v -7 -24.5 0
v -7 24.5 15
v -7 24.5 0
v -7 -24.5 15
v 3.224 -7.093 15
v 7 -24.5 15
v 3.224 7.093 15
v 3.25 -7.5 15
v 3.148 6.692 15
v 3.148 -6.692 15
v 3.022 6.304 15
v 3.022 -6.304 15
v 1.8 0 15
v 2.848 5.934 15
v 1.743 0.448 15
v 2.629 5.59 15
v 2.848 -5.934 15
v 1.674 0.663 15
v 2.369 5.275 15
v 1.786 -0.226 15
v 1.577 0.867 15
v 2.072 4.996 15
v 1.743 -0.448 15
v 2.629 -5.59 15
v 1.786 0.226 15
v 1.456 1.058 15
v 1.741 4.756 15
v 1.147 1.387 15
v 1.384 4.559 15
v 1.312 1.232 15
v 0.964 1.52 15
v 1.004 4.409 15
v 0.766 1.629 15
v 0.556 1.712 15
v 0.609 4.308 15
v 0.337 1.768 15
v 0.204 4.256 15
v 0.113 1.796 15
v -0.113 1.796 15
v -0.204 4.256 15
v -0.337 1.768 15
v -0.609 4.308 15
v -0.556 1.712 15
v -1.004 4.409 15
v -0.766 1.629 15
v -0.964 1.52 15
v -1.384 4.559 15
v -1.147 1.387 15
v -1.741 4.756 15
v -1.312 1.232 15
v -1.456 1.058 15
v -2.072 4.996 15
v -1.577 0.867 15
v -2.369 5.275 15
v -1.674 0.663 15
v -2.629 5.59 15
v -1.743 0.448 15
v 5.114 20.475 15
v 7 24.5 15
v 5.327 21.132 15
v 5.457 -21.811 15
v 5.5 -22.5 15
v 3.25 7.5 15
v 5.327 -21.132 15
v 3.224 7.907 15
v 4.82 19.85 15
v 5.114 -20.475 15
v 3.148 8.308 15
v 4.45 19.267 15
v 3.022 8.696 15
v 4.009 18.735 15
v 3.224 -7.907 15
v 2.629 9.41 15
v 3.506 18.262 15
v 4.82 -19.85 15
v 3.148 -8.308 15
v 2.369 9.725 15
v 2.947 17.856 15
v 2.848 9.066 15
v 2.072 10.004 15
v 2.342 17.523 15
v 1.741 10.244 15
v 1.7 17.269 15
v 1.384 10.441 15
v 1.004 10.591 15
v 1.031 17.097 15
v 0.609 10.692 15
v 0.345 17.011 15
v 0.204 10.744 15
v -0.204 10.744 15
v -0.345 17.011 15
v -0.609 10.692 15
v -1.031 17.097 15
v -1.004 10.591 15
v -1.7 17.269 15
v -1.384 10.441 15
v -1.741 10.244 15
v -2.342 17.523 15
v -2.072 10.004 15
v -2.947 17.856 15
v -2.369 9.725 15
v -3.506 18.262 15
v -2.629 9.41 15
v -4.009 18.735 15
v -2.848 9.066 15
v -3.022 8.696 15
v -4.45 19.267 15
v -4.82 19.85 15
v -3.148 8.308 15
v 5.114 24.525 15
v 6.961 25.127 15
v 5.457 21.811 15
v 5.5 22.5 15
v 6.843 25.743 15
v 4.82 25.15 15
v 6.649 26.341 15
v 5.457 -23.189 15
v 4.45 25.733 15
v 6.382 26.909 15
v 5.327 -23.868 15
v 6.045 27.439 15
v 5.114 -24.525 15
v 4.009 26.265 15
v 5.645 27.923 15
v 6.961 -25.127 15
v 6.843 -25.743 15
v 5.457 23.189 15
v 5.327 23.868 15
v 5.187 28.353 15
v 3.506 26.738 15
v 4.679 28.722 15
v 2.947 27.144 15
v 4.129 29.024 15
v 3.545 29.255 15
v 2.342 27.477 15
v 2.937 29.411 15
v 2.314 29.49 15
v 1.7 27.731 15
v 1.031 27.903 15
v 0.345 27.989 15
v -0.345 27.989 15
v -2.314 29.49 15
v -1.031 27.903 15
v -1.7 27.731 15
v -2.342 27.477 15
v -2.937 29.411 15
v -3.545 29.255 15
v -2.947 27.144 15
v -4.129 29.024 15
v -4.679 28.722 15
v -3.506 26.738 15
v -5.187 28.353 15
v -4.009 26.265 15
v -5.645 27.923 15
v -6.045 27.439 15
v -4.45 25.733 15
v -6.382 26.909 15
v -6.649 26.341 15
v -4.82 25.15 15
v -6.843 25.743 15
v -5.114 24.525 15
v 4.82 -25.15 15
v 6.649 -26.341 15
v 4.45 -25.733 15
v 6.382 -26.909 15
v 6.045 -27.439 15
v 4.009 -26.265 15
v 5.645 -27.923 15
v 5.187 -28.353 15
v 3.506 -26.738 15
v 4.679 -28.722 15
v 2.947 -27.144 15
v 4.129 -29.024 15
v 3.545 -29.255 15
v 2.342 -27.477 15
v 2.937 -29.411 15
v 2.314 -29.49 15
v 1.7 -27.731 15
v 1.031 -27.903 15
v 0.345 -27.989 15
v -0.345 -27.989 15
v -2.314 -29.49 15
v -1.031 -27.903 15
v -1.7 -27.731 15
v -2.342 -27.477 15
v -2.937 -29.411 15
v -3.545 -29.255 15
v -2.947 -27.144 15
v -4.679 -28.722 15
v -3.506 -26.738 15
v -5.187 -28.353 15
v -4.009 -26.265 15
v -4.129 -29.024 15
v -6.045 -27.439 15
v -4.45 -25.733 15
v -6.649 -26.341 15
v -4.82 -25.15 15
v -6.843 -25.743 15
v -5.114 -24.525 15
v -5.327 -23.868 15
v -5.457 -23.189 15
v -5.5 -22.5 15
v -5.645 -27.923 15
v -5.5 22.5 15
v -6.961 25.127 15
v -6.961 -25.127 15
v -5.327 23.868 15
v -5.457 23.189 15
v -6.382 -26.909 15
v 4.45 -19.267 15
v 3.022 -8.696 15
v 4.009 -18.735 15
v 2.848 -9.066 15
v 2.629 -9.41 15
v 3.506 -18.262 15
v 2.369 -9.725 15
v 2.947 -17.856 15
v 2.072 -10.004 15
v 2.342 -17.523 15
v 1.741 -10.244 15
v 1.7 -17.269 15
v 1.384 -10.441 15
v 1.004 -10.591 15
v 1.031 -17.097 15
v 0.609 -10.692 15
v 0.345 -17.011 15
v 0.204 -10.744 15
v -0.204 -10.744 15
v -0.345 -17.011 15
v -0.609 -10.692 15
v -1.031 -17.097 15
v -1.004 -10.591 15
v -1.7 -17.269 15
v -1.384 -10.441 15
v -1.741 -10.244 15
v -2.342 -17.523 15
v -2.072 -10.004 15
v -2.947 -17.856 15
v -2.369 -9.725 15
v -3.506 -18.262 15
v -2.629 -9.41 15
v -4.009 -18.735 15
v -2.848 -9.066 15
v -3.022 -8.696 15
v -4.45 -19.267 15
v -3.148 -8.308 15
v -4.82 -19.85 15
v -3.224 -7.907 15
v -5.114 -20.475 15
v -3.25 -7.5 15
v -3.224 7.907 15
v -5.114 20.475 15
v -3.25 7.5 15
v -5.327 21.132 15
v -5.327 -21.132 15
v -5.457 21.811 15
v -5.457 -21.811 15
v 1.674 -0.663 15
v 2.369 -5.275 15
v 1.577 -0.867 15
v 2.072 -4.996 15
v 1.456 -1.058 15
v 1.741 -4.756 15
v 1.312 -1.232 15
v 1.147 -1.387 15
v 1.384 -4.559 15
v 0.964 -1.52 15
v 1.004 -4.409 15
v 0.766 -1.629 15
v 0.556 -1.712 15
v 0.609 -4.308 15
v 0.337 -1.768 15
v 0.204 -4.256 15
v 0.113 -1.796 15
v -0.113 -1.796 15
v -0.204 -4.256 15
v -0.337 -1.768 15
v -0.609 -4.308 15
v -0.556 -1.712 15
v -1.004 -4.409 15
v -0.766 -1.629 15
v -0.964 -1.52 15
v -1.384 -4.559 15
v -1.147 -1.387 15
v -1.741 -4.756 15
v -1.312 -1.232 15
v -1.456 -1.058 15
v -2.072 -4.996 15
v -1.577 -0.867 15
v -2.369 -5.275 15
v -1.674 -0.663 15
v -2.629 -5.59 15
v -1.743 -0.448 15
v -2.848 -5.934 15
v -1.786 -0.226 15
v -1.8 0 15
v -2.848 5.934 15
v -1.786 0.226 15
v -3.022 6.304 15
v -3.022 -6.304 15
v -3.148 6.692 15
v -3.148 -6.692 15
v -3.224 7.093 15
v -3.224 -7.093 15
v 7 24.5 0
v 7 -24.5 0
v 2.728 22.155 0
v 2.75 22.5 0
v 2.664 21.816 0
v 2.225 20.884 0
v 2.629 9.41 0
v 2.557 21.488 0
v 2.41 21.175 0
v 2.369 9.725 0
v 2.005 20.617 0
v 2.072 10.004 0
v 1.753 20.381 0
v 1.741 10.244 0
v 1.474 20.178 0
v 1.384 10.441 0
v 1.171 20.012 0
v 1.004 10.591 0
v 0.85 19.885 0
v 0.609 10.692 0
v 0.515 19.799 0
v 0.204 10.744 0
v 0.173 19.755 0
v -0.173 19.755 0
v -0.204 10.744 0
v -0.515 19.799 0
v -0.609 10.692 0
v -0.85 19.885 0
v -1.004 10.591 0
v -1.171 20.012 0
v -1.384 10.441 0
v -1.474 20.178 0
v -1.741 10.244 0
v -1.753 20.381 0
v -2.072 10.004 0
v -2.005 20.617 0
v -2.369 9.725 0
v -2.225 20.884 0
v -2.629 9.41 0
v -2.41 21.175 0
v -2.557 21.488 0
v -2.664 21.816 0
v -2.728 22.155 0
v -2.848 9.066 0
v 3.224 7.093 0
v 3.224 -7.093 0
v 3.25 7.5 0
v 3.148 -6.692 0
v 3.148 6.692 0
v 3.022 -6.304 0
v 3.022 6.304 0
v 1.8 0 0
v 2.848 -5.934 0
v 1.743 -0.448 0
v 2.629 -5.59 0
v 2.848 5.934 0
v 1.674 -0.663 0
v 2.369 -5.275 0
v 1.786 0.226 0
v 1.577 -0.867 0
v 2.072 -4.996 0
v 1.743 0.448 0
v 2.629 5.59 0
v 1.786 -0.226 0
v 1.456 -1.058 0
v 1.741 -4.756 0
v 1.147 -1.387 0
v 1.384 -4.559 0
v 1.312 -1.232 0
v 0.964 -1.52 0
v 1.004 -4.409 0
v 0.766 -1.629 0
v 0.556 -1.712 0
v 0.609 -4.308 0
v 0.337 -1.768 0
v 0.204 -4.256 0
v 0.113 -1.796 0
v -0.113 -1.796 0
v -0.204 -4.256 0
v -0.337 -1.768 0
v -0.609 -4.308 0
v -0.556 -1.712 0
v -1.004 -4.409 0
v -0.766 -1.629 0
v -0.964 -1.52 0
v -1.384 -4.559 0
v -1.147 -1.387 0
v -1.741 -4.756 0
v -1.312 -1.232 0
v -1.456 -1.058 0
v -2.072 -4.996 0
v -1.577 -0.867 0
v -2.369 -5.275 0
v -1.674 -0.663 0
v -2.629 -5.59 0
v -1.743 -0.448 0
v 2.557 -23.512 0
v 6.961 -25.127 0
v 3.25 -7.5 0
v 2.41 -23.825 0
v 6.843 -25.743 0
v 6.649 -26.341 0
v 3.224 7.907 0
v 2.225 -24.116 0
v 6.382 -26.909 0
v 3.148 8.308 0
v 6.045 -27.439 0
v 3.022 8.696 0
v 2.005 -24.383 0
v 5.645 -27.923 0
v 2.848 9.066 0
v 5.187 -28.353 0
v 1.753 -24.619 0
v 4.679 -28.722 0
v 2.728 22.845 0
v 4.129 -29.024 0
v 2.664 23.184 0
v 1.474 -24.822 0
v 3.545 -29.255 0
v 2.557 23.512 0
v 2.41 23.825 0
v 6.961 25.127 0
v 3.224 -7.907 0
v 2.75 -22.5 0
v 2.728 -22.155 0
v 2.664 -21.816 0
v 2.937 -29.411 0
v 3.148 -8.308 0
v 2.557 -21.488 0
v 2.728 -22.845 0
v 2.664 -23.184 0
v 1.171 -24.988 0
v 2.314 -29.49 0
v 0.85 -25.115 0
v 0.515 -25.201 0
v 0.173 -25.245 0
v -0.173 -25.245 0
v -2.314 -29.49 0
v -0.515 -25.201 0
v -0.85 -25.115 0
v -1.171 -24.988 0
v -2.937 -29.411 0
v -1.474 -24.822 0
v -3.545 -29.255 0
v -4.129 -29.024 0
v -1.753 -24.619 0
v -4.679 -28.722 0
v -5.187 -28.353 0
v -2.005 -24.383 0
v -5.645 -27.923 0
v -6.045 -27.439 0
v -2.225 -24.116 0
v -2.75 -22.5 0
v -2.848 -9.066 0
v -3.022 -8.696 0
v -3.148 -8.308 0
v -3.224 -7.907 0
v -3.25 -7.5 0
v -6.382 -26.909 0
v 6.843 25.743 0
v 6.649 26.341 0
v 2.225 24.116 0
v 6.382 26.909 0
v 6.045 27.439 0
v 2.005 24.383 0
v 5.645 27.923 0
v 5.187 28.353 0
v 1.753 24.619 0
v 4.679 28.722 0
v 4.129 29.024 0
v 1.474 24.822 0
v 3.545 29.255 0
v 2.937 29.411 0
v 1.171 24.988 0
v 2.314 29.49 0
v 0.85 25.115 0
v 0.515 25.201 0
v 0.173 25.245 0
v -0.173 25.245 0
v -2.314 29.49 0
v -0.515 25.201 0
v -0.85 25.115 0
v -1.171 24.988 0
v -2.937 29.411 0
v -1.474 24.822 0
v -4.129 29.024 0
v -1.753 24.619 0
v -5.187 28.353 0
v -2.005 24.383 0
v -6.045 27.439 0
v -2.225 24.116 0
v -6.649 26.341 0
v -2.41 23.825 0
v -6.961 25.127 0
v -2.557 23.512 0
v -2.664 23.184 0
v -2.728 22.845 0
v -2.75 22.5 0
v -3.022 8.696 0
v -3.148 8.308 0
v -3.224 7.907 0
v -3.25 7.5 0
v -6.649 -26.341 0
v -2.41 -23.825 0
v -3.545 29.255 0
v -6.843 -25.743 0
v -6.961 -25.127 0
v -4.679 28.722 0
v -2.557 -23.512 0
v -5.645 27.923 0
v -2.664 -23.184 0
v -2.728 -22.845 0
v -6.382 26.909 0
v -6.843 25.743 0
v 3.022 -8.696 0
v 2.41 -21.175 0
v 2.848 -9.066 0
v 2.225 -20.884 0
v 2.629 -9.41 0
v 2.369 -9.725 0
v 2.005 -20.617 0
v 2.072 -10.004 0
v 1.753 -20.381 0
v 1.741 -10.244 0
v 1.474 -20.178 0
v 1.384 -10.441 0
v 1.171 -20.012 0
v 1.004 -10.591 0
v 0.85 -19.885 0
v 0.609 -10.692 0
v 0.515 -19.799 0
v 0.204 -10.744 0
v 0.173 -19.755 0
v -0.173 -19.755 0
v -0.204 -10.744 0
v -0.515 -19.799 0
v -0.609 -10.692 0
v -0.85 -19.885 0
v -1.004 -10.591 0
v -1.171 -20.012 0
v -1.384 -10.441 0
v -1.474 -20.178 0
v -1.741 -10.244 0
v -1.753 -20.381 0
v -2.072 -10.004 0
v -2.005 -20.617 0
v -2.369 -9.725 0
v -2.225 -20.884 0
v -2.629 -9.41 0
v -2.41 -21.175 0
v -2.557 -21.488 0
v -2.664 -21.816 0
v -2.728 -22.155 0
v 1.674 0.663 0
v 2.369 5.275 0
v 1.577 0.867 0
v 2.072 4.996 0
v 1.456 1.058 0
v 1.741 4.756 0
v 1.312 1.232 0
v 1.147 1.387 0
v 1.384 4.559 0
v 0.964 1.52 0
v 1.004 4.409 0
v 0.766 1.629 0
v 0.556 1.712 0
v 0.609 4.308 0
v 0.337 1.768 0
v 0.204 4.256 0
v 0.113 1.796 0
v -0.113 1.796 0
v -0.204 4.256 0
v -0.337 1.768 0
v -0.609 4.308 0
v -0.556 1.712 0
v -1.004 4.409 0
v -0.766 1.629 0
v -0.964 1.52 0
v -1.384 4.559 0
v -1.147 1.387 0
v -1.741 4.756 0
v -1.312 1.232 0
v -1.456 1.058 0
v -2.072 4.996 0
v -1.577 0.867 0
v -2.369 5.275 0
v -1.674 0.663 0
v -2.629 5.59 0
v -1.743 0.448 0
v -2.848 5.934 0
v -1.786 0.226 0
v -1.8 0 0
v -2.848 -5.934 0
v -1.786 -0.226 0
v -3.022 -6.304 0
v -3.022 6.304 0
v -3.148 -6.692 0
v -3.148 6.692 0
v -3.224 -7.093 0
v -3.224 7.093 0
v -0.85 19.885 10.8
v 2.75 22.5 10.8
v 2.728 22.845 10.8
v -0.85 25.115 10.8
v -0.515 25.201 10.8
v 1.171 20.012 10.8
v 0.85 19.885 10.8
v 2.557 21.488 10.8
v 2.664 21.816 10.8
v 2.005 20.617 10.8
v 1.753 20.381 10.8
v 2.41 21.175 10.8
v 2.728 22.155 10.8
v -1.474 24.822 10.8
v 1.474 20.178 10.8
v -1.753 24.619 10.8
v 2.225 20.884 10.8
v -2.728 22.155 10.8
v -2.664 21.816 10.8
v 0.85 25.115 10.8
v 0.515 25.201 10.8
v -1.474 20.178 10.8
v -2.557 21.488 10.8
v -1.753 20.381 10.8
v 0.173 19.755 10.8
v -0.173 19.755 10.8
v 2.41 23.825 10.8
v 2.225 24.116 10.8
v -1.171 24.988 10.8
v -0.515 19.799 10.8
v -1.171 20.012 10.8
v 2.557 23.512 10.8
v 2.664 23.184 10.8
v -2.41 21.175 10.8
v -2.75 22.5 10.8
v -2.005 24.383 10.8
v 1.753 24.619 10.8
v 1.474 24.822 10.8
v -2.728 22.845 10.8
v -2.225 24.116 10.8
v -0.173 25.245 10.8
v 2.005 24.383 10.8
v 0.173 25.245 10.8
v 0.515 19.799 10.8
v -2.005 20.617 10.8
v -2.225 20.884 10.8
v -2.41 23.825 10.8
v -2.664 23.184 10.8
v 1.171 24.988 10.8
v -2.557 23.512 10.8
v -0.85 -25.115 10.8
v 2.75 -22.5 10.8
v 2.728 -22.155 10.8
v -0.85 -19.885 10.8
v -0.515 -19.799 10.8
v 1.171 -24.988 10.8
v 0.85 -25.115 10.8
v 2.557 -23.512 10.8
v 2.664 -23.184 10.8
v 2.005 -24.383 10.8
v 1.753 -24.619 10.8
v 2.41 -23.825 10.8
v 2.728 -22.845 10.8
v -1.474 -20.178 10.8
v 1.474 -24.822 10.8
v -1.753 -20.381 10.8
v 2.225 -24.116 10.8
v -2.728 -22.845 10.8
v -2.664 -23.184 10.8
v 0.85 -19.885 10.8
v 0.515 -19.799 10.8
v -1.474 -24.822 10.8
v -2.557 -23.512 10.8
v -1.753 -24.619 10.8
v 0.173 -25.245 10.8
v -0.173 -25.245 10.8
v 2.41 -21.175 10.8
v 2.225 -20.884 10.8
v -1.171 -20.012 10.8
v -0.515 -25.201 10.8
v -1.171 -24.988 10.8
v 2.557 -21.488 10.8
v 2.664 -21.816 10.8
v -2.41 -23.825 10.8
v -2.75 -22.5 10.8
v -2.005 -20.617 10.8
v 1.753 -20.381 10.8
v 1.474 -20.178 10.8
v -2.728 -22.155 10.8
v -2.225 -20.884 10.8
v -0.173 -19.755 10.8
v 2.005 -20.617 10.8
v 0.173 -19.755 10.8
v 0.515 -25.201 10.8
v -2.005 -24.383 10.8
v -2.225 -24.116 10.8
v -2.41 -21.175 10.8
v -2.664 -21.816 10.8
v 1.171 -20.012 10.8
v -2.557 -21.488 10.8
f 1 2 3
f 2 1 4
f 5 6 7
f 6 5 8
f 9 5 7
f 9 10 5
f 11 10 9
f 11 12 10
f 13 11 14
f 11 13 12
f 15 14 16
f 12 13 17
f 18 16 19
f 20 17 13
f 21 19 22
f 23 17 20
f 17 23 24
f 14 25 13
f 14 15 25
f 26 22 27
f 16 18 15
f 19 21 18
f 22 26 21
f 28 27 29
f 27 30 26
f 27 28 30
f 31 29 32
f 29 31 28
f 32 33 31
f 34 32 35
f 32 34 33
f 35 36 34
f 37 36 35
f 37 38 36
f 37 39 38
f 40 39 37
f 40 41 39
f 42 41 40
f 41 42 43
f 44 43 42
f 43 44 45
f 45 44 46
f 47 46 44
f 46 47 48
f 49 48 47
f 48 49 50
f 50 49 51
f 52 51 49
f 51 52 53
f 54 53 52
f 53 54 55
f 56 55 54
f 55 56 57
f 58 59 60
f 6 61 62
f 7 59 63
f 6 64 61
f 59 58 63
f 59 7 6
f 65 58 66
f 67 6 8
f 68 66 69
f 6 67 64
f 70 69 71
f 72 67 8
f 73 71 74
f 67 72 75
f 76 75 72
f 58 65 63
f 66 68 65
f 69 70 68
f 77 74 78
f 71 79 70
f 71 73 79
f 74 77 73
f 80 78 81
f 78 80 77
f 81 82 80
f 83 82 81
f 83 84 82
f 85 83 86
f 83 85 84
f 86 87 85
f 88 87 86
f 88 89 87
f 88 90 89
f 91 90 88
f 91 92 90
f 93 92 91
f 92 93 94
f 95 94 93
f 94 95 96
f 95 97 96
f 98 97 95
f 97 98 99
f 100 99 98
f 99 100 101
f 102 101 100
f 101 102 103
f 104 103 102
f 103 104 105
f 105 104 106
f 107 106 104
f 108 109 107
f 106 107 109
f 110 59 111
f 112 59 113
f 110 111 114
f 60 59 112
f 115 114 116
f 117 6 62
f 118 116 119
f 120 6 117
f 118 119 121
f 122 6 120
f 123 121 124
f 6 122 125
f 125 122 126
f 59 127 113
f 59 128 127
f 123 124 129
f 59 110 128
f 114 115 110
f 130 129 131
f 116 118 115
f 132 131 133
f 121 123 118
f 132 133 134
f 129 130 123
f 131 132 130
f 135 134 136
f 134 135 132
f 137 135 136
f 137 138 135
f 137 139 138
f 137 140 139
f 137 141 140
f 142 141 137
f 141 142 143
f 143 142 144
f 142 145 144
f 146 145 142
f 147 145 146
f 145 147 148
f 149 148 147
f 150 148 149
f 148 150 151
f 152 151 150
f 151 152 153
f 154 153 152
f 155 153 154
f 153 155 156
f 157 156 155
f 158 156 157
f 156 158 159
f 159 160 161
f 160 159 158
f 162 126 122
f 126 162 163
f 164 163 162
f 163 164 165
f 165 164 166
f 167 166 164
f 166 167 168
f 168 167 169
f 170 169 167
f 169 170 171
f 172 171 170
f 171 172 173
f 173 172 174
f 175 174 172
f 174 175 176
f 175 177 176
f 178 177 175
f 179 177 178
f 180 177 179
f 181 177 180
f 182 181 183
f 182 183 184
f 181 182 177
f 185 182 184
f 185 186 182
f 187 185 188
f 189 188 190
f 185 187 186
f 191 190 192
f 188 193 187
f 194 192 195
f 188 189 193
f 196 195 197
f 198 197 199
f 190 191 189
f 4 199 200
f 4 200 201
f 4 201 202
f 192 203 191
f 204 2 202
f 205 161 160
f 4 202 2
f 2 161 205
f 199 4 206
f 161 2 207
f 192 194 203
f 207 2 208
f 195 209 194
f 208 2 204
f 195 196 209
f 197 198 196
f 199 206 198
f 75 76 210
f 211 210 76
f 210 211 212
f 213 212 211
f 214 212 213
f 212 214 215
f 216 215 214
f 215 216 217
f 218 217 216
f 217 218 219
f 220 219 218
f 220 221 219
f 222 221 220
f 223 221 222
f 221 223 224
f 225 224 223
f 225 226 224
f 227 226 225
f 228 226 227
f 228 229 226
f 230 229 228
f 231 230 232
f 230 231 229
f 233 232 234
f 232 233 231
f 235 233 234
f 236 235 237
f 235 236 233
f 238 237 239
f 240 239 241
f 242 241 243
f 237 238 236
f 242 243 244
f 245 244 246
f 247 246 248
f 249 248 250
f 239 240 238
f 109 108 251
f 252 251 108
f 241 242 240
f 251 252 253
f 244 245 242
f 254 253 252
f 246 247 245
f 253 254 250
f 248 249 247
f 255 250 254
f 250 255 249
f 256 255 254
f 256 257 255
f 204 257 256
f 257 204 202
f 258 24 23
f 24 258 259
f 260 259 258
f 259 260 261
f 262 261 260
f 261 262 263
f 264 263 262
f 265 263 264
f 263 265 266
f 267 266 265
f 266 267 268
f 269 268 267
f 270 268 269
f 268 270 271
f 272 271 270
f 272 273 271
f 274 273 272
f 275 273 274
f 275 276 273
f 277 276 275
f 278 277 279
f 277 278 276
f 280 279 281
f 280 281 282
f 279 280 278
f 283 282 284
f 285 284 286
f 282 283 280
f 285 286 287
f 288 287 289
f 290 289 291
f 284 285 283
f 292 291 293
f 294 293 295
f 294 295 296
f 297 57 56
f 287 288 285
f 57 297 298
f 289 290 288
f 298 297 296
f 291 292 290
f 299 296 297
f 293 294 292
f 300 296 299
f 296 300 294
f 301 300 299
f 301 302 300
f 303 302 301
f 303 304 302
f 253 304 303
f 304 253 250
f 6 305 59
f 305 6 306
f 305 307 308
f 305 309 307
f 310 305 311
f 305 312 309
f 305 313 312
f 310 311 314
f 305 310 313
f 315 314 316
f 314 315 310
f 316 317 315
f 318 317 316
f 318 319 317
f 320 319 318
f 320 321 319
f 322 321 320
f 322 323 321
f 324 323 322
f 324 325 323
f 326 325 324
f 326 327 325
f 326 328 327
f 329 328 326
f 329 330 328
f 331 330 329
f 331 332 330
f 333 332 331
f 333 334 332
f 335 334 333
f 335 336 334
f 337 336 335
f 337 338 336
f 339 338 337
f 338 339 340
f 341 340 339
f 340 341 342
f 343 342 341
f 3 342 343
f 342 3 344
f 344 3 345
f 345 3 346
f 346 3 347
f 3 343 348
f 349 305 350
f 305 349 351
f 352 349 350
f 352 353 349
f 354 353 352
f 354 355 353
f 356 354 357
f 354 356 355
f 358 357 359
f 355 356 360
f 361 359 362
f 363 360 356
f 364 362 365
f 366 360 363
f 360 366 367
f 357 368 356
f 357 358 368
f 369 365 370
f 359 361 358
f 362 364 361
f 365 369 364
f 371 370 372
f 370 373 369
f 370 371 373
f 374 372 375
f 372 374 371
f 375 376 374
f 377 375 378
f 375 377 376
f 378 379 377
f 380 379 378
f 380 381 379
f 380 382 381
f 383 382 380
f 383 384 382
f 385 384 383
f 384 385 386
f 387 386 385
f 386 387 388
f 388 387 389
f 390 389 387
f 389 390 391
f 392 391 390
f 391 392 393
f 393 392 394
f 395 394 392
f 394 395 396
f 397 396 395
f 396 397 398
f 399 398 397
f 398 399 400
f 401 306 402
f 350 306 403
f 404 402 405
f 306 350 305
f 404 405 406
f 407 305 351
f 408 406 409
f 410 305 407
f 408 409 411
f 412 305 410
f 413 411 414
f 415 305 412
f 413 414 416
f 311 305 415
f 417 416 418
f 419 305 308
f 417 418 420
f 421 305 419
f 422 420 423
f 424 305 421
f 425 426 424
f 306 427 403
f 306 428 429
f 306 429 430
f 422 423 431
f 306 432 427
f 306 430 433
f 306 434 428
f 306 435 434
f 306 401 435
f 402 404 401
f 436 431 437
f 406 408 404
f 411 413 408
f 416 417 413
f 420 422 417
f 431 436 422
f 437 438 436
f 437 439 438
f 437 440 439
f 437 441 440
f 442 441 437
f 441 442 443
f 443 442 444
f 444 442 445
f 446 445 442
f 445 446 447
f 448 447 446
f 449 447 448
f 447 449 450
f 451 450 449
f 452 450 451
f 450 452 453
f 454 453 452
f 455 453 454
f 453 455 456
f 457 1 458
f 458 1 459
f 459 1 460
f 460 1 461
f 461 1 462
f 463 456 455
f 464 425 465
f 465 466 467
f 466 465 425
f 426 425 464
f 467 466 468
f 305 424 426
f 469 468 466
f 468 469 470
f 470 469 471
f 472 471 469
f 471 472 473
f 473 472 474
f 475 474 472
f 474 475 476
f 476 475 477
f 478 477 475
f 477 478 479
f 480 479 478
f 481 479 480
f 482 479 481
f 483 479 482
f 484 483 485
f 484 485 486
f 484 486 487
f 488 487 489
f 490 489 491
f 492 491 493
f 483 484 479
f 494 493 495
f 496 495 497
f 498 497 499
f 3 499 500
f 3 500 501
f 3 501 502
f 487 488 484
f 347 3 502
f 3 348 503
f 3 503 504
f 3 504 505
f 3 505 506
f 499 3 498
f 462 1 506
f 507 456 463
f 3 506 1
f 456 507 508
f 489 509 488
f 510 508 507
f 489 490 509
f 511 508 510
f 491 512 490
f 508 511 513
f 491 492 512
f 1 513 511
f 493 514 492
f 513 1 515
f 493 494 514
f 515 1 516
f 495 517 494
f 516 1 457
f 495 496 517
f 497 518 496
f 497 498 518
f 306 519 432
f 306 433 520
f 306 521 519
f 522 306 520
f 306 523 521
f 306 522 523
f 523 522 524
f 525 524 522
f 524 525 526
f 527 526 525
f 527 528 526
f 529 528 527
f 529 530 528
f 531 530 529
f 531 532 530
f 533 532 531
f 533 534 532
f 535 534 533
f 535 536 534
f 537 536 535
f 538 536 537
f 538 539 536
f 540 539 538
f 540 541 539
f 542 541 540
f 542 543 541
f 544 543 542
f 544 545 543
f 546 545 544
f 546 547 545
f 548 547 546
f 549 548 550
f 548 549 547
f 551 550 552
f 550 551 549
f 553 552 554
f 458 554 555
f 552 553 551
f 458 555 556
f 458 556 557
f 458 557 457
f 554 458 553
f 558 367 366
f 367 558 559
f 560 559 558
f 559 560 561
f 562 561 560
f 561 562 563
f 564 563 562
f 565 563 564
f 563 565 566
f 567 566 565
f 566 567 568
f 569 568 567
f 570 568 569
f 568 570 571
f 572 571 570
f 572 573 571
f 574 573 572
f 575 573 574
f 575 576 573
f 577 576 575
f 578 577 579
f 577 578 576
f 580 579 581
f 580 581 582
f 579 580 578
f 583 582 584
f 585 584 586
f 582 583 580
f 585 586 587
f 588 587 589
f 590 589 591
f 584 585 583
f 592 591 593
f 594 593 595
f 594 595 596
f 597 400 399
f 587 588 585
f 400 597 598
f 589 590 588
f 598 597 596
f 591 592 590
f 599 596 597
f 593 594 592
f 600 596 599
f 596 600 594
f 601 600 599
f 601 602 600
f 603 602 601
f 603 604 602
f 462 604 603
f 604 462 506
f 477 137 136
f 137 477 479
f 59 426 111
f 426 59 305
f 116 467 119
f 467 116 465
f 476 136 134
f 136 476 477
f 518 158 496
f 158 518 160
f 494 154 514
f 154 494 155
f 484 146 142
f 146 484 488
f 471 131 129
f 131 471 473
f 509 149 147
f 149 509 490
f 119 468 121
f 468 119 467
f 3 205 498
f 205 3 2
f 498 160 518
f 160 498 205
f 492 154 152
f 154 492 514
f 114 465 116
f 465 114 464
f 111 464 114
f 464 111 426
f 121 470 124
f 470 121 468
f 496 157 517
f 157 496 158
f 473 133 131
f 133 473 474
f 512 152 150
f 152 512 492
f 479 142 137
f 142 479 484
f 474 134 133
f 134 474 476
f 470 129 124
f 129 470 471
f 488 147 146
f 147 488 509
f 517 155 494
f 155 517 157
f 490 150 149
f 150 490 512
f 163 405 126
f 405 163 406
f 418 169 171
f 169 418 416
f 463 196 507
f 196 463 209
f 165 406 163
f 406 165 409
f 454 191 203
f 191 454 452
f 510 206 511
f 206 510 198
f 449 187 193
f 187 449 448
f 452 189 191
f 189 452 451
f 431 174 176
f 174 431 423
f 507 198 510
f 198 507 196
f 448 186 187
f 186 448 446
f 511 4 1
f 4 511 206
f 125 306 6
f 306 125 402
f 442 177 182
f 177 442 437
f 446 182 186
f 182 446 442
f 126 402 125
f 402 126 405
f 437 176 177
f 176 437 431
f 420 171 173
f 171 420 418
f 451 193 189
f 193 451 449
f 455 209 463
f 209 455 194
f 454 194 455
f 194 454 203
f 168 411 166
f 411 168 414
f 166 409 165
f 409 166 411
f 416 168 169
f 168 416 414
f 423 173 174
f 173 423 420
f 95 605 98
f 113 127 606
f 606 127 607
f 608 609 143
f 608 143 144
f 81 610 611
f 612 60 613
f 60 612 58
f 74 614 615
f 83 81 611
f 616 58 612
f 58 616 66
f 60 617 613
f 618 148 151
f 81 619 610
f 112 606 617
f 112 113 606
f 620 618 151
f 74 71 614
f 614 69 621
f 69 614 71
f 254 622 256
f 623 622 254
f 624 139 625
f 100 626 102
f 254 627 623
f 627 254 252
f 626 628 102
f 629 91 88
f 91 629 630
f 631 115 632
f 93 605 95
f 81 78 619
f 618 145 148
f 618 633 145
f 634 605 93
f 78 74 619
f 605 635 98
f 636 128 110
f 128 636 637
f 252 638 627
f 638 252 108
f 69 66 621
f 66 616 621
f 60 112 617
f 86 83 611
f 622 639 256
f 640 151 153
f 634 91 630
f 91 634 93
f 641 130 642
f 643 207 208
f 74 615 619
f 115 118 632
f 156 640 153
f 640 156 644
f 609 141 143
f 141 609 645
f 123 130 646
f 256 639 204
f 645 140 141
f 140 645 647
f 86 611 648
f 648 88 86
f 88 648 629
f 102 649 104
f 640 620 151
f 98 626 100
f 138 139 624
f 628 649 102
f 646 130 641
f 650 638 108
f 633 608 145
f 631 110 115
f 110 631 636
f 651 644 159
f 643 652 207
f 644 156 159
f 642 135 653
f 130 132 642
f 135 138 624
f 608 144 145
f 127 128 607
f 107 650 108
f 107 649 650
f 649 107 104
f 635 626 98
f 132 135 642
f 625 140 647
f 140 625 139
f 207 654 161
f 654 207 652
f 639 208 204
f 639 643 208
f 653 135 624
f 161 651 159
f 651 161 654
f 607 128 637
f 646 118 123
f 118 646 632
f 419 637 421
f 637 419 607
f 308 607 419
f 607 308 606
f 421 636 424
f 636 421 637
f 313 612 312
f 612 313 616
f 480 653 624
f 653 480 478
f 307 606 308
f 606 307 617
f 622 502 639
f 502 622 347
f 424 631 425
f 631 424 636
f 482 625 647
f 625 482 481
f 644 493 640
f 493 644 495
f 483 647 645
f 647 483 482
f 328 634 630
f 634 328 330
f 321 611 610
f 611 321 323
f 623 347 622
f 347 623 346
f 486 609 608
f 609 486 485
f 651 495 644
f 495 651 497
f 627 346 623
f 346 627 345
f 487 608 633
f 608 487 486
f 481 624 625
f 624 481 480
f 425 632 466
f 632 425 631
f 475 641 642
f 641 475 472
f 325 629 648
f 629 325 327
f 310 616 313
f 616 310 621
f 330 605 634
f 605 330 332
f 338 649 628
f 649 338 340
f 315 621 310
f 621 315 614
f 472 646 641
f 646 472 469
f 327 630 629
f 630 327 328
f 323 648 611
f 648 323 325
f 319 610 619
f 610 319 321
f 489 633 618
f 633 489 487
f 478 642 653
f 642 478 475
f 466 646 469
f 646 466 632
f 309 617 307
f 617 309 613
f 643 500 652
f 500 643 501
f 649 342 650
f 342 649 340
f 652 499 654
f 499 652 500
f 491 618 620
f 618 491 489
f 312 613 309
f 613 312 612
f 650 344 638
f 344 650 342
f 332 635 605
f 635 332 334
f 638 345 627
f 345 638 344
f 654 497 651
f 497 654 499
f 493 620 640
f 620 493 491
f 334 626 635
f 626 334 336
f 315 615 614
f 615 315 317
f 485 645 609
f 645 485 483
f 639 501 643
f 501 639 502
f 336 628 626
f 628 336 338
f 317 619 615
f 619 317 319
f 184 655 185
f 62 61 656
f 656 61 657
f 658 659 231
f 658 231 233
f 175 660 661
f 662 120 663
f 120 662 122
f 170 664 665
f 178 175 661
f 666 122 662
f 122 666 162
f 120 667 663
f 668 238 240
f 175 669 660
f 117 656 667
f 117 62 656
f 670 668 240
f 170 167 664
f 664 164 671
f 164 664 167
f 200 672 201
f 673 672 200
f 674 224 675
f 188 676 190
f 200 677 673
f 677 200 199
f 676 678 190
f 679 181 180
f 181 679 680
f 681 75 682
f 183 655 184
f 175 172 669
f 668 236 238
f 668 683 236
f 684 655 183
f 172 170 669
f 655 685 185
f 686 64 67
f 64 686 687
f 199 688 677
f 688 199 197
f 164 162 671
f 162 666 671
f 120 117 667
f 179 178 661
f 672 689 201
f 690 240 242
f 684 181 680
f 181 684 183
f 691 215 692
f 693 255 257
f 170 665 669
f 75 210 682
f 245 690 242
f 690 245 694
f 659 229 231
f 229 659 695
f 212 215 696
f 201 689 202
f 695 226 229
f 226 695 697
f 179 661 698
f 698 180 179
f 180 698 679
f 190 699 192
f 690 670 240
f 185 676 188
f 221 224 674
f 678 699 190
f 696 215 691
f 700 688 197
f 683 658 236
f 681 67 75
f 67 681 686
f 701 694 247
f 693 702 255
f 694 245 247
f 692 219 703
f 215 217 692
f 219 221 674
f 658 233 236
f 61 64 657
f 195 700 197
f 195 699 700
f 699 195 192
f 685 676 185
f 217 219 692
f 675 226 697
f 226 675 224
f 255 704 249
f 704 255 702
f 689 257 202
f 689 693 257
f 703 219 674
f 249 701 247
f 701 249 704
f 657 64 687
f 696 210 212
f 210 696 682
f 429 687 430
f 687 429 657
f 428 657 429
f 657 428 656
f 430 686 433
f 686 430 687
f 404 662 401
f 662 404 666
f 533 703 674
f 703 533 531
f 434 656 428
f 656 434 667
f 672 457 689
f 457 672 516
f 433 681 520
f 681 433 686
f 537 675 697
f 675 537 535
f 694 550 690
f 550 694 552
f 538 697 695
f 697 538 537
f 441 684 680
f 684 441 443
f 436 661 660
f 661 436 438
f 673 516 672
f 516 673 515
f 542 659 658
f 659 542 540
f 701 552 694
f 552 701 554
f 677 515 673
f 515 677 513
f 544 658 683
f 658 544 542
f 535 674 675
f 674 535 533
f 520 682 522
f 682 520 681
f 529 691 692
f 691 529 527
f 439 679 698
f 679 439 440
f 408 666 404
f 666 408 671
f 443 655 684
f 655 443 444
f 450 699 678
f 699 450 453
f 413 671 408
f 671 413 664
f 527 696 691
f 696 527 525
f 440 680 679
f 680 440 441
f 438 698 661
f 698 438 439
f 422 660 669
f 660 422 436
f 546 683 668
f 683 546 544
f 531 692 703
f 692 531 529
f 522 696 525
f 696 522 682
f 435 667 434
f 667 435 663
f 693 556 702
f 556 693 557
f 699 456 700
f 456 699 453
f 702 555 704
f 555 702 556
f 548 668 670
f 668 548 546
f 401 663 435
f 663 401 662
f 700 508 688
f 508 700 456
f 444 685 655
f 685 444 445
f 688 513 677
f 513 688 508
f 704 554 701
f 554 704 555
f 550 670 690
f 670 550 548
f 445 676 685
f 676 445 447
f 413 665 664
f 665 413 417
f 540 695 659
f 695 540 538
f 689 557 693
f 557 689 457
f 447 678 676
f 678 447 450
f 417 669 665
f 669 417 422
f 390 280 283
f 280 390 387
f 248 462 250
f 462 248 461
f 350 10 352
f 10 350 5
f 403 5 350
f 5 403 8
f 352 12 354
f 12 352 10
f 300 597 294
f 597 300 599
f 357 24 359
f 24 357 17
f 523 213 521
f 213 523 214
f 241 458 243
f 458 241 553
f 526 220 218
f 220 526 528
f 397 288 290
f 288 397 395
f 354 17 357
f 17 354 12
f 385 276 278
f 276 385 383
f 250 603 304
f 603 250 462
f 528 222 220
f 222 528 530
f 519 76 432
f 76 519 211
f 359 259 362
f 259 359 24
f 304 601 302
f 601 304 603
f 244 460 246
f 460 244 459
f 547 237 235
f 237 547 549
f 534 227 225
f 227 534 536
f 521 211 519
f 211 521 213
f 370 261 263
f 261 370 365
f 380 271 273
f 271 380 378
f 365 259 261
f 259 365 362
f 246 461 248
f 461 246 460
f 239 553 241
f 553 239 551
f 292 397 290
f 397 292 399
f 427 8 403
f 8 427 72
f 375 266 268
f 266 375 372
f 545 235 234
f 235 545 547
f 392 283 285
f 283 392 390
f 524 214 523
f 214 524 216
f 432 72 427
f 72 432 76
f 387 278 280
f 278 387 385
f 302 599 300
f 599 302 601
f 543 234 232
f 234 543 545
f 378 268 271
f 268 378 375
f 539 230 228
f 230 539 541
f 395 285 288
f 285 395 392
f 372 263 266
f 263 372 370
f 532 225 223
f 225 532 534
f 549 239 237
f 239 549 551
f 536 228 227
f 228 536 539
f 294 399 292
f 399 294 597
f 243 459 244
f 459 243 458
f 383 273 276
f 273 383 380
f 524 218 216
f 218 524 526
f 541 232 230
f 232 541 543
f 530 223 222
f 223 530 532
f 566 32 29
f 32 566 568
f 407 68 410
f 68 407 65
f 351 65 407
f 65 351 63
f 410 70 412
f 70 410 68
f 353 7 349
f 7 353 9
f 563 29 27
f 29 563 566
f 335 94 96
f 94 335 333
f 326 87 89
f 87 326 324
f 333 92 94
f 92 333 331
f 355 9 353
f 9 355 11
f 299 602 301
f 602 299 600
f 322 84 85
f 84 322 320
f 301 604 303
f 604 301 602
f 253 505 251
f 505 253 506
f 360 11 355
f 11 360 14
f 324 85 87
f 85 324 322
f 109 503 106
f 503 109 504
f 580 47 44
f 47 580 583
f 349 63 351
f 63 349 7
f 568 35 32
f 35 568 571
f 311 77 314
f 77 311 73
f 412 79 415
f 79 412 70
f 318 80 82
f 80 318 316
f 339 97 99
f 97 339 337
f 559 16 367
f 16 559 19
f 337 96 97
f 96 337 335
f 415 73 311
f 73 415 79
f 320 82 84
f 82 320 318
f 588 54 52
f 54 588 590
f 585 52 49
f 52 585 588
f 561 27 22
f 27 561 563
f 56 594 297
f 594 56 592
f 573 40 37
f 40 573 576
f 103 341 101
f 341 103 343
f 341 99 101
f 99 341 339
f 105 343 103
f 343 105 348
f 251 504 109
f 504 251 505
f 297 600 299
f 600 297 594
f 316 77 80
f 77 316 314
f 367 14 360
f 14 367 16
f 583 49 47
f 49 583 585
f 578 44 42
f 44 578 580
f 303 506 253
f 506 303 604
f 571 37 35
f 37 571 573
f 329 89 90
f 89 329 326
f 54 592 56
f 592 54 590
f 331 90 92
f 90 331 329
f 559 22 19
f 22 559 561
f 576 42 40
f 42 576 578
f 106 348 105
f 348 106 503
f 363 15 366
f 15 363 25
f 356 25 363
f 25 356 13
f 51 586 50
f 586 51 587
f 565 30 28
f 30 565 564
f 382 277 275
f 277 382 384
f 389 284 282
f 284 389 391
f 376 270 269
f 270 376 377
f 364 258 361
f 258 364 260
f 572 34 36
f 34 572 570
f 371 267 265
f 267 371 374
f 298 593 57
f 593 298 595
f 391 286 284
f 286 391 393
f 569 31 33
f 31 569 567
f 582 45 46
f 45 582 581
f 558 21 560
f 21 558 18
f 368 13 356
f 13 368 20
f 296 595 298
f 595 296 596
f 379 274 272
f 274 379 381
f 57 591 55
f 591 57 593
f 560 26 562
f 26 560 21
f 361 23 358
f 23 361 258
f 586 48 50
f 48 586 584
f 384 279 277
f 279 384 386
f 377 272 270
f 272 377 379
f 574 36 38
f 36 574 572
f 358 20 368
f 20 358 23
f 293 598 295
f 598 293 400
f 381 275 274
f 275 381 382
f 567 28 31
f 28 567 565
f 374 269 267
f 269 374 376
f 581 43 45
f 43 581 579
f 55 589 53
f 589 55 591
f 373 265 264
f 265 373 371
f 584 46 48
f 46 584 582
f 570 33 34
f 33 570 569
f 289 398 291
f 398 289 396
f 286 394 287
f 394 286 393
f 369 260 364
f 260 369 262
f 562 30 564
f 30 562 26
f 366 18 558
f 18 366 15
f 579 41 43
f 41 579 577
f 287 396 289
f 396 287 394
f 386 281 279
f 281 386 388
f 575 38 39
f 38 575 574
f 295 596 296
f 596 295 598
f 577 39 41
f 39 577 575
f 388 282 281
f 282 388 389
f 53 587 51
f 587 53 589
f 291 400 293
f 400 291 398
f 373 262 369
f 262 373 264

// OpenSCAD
$fn = 50;


difference() {
	union() {
		hull() {
			translate(v = [-2.0000000000, 9.5000000000, 0]) {
				cylinder(h = 15, r = 5);
			}
			translate(v = [2.0000000000, 9.5000000000, 0]) {
				cylinder(h = 15, r = 5);
			}
			translate(v = [-2.0000000000, -9.5000000000, 0]) {
				cylinder(h = 15, r = 5);
			}
			translate(v = [2.0000000000, -9.5000000000, 0]) {
				cylinder(h = 15, r = 5);
			}
		}
		translate(v = [0.0000000000, 15.0000000000, 0]) {
			hull() {
				translate(v = [-2.0000000000, 9.5000000000, 0]) {
					cylinder(h = 15, r = 5);
				}
				translate(v = [2.0000000000, 9.5000000000, 0]) {
					cylinder(h = 15, r = 5);
				}
				translate(v = [-2.0000000000, -9.5000000000, 0]) {
					cylinder(h = 15, r = 5);
				}
				translate(v = [2.0000000000, -9.5000000000, 0]) {
					cylinder(h = 15, r = 5);
				}
			}
		}
		translate(v = [0.0000000000, 15.0000000000, 0]) {
			hull() {
				translate(v = [-2.0000000000, 9.5000000000, 0]) {
					cylinder(h = 15, r = 5);
				}
				translate(v = [2.0000000000, 9.5000000000, 0]) {
					cylinder(h = 15, r = 5);
				}
				translate(v = [-2.0000000000, -9.5000000000, 0]) {
					cylinder(h = 15, r = 5);
				}
				translate(v = [2.0000000000, -9.5000000000, 0]) {
					cylinder(h = 15, r = 5);
				}
			}
		}
		translate(v = [0.0000000000, -15.0000000000, 0]) {
			hull() {
				translate(v = [-2.0000000000, 9.5000000000, 0]) {
					cylinder(h = 15, r = 5);
				}
				translate(v = [2.0000000000, 9.5000000000, 0]) {
					cylinder(h = 15, r = 5);
				}
				translate(v = [-2.0000000000, -9.5000000000, 0]) {
					cylinder(h = 15, r = 5);
				}
				translate(v = [2.0000000000, -9.5000000000, 0]) {
					cylinder(h = 15, r = 5);
				}
			}
		}
		translate(v = [0.0000000000, -15.0000000000, 0]) {
			hull() {
				translate(v = [-2.0000000000, 9.5000000000, 0]) {
					cylinder(h = 15, r = 5);
				}
				translate(v = [2.0000000000, 9.5000000000, 0]) {
					cylinder(h = 15, r = 5);
				}
				translate(v = [-2.0000000000, -9.5000000000, 0]) {
					cylinder(h = 15, r = 5);
				}
				translate(v = [2.0000000000, -9.5000000000, 0]) {
					cylinder(h = 15, r = 5);
				}
			}
		}
	}
	union() {
		translate(v = [0.0000000000, 22.5000000000, 15]) {
			rotate(a = [0, 0, 0]) {
				difference() {
					union() {
						#translate(v = [0, 0, -15.0000000000]) {
							cylinder(h = 15, r = 2.2500000000);
						}
						#translate(v = [0, 0, -4.2000000000]) {
							cylinder(h = 4.2000000000, r1 = 2.7500000000, r2 = 5.5000000000);
						}
						#translate(v = [0, 0, -15.0000000000]) {
							cylinder(h = 15, r = 2.7500000000);
						}
						#translate(v = [0, 0, -15.0000000000]) {
							cylinder(h = 15, r = 2.2500000000);
						}
					}
					union();
				}
			}
		}
		translate(v = [0.0000000000, 22.5000000000, 15]) {
			rotate(a = [0, 0, 0]) {
				difference() {
					union() {
						#translate(v = [0, 0, -15.0000000000]) {
							cylinder(h = 15, r = 2.2500000000);
						}
						#translate(v = [0, 0, -4.2000000000]) {
							cylinder(h = 4.2000000000, r1 = 2.7500000000, r2 = 5.5000000000);
						}
						#translate(v = [0, 0, -15.0000000000]) {
							cylinder(h = 15, r = 2.7500000000);
						}
						#translate(v = [0, 0, -15.0000000000]) {
							cylinder(h = 15, r = 2.2500000000);
						}
					}
					union();
				}
			}
		}
		translate(v = [0.0000000000, -22.5000000000, 15]) {
			rotate(a = [0, 0, 0]) {
				difference() {
					union() {
						#translate(v = [0, 0, -15.0000000000]) {
							cylinder(h = 15, r = 2.2500000000);
						}
						#translate(v = [0, 0, -4.2000000000]) {
							cylinder(h = 4.2000000000, r1 = 2.7500000000, r2 = 5.5000000000);
						}
						#translate(v = [0, 0, -15.0000000000]) {
							cylinder(h = 15, r = 2.7500000000);
						}
						#translate(v = [0, 0, -15.0000000000]) {
							cylinder(h = 15, r = 2.2500000000);
						}
					}
					union();
				}
			}
		}
		translate(v = [0.0000000000, -22.5000000000, 15]) {
			rotate(a = [0, 0, 0]) {
				difference() {
					union() {
						#translate(v = [0, 0, -15.0000000000]) {
							cylinder(h = 15, r = 2.2500000000);
						}
						#translate(v = [0, 0, -4.2000000000]) {
							cylinder(h = 4.2000000000, r1 = 2.7500000000, r2 = 5.5000000000);
						}
						#translate(v = [0, 0, -15.0000000000]) {
							cylinder(h = 15, r = 2.7500000000);
						}
						#translate(v = [0, 0, -15.0000000000]) {
							cylinder(h = 15, r = 2.2500000000);
						}
					}
					union();
				}
			}
		}
		translate(v = [0.0000000000, -7.5000000000, 0]) {
			translate(v = [0, 0, -100]) {
				cylinder(h = 200, r = 3.2500000000);
			}
		}
		translate(v = [0.0000000000, 7.5000000000, 0]) {
			translate(v = [0, 0, -100]) {
				cylinder(h = 200, r = 3.2500000000);
			}
		}
		translate(v = [0.0000000000, -7.5000000000, 0]) {
			translate(v = [0, 0, -100]) {
				cylinder(h = 200, r = 1.8000000000);
			}
		}
		translate(v = [0, 0, -100]) {
			cylinder(h = 200, r = 1.8000000000);
		}
		translate(v = [0.0000000000, 7.5000000000, 0]) {
			translate(v = [0, 0, -100]) {
				cylinder(h = 200, r = 1.8000000000);
			}
		}
	}
}
